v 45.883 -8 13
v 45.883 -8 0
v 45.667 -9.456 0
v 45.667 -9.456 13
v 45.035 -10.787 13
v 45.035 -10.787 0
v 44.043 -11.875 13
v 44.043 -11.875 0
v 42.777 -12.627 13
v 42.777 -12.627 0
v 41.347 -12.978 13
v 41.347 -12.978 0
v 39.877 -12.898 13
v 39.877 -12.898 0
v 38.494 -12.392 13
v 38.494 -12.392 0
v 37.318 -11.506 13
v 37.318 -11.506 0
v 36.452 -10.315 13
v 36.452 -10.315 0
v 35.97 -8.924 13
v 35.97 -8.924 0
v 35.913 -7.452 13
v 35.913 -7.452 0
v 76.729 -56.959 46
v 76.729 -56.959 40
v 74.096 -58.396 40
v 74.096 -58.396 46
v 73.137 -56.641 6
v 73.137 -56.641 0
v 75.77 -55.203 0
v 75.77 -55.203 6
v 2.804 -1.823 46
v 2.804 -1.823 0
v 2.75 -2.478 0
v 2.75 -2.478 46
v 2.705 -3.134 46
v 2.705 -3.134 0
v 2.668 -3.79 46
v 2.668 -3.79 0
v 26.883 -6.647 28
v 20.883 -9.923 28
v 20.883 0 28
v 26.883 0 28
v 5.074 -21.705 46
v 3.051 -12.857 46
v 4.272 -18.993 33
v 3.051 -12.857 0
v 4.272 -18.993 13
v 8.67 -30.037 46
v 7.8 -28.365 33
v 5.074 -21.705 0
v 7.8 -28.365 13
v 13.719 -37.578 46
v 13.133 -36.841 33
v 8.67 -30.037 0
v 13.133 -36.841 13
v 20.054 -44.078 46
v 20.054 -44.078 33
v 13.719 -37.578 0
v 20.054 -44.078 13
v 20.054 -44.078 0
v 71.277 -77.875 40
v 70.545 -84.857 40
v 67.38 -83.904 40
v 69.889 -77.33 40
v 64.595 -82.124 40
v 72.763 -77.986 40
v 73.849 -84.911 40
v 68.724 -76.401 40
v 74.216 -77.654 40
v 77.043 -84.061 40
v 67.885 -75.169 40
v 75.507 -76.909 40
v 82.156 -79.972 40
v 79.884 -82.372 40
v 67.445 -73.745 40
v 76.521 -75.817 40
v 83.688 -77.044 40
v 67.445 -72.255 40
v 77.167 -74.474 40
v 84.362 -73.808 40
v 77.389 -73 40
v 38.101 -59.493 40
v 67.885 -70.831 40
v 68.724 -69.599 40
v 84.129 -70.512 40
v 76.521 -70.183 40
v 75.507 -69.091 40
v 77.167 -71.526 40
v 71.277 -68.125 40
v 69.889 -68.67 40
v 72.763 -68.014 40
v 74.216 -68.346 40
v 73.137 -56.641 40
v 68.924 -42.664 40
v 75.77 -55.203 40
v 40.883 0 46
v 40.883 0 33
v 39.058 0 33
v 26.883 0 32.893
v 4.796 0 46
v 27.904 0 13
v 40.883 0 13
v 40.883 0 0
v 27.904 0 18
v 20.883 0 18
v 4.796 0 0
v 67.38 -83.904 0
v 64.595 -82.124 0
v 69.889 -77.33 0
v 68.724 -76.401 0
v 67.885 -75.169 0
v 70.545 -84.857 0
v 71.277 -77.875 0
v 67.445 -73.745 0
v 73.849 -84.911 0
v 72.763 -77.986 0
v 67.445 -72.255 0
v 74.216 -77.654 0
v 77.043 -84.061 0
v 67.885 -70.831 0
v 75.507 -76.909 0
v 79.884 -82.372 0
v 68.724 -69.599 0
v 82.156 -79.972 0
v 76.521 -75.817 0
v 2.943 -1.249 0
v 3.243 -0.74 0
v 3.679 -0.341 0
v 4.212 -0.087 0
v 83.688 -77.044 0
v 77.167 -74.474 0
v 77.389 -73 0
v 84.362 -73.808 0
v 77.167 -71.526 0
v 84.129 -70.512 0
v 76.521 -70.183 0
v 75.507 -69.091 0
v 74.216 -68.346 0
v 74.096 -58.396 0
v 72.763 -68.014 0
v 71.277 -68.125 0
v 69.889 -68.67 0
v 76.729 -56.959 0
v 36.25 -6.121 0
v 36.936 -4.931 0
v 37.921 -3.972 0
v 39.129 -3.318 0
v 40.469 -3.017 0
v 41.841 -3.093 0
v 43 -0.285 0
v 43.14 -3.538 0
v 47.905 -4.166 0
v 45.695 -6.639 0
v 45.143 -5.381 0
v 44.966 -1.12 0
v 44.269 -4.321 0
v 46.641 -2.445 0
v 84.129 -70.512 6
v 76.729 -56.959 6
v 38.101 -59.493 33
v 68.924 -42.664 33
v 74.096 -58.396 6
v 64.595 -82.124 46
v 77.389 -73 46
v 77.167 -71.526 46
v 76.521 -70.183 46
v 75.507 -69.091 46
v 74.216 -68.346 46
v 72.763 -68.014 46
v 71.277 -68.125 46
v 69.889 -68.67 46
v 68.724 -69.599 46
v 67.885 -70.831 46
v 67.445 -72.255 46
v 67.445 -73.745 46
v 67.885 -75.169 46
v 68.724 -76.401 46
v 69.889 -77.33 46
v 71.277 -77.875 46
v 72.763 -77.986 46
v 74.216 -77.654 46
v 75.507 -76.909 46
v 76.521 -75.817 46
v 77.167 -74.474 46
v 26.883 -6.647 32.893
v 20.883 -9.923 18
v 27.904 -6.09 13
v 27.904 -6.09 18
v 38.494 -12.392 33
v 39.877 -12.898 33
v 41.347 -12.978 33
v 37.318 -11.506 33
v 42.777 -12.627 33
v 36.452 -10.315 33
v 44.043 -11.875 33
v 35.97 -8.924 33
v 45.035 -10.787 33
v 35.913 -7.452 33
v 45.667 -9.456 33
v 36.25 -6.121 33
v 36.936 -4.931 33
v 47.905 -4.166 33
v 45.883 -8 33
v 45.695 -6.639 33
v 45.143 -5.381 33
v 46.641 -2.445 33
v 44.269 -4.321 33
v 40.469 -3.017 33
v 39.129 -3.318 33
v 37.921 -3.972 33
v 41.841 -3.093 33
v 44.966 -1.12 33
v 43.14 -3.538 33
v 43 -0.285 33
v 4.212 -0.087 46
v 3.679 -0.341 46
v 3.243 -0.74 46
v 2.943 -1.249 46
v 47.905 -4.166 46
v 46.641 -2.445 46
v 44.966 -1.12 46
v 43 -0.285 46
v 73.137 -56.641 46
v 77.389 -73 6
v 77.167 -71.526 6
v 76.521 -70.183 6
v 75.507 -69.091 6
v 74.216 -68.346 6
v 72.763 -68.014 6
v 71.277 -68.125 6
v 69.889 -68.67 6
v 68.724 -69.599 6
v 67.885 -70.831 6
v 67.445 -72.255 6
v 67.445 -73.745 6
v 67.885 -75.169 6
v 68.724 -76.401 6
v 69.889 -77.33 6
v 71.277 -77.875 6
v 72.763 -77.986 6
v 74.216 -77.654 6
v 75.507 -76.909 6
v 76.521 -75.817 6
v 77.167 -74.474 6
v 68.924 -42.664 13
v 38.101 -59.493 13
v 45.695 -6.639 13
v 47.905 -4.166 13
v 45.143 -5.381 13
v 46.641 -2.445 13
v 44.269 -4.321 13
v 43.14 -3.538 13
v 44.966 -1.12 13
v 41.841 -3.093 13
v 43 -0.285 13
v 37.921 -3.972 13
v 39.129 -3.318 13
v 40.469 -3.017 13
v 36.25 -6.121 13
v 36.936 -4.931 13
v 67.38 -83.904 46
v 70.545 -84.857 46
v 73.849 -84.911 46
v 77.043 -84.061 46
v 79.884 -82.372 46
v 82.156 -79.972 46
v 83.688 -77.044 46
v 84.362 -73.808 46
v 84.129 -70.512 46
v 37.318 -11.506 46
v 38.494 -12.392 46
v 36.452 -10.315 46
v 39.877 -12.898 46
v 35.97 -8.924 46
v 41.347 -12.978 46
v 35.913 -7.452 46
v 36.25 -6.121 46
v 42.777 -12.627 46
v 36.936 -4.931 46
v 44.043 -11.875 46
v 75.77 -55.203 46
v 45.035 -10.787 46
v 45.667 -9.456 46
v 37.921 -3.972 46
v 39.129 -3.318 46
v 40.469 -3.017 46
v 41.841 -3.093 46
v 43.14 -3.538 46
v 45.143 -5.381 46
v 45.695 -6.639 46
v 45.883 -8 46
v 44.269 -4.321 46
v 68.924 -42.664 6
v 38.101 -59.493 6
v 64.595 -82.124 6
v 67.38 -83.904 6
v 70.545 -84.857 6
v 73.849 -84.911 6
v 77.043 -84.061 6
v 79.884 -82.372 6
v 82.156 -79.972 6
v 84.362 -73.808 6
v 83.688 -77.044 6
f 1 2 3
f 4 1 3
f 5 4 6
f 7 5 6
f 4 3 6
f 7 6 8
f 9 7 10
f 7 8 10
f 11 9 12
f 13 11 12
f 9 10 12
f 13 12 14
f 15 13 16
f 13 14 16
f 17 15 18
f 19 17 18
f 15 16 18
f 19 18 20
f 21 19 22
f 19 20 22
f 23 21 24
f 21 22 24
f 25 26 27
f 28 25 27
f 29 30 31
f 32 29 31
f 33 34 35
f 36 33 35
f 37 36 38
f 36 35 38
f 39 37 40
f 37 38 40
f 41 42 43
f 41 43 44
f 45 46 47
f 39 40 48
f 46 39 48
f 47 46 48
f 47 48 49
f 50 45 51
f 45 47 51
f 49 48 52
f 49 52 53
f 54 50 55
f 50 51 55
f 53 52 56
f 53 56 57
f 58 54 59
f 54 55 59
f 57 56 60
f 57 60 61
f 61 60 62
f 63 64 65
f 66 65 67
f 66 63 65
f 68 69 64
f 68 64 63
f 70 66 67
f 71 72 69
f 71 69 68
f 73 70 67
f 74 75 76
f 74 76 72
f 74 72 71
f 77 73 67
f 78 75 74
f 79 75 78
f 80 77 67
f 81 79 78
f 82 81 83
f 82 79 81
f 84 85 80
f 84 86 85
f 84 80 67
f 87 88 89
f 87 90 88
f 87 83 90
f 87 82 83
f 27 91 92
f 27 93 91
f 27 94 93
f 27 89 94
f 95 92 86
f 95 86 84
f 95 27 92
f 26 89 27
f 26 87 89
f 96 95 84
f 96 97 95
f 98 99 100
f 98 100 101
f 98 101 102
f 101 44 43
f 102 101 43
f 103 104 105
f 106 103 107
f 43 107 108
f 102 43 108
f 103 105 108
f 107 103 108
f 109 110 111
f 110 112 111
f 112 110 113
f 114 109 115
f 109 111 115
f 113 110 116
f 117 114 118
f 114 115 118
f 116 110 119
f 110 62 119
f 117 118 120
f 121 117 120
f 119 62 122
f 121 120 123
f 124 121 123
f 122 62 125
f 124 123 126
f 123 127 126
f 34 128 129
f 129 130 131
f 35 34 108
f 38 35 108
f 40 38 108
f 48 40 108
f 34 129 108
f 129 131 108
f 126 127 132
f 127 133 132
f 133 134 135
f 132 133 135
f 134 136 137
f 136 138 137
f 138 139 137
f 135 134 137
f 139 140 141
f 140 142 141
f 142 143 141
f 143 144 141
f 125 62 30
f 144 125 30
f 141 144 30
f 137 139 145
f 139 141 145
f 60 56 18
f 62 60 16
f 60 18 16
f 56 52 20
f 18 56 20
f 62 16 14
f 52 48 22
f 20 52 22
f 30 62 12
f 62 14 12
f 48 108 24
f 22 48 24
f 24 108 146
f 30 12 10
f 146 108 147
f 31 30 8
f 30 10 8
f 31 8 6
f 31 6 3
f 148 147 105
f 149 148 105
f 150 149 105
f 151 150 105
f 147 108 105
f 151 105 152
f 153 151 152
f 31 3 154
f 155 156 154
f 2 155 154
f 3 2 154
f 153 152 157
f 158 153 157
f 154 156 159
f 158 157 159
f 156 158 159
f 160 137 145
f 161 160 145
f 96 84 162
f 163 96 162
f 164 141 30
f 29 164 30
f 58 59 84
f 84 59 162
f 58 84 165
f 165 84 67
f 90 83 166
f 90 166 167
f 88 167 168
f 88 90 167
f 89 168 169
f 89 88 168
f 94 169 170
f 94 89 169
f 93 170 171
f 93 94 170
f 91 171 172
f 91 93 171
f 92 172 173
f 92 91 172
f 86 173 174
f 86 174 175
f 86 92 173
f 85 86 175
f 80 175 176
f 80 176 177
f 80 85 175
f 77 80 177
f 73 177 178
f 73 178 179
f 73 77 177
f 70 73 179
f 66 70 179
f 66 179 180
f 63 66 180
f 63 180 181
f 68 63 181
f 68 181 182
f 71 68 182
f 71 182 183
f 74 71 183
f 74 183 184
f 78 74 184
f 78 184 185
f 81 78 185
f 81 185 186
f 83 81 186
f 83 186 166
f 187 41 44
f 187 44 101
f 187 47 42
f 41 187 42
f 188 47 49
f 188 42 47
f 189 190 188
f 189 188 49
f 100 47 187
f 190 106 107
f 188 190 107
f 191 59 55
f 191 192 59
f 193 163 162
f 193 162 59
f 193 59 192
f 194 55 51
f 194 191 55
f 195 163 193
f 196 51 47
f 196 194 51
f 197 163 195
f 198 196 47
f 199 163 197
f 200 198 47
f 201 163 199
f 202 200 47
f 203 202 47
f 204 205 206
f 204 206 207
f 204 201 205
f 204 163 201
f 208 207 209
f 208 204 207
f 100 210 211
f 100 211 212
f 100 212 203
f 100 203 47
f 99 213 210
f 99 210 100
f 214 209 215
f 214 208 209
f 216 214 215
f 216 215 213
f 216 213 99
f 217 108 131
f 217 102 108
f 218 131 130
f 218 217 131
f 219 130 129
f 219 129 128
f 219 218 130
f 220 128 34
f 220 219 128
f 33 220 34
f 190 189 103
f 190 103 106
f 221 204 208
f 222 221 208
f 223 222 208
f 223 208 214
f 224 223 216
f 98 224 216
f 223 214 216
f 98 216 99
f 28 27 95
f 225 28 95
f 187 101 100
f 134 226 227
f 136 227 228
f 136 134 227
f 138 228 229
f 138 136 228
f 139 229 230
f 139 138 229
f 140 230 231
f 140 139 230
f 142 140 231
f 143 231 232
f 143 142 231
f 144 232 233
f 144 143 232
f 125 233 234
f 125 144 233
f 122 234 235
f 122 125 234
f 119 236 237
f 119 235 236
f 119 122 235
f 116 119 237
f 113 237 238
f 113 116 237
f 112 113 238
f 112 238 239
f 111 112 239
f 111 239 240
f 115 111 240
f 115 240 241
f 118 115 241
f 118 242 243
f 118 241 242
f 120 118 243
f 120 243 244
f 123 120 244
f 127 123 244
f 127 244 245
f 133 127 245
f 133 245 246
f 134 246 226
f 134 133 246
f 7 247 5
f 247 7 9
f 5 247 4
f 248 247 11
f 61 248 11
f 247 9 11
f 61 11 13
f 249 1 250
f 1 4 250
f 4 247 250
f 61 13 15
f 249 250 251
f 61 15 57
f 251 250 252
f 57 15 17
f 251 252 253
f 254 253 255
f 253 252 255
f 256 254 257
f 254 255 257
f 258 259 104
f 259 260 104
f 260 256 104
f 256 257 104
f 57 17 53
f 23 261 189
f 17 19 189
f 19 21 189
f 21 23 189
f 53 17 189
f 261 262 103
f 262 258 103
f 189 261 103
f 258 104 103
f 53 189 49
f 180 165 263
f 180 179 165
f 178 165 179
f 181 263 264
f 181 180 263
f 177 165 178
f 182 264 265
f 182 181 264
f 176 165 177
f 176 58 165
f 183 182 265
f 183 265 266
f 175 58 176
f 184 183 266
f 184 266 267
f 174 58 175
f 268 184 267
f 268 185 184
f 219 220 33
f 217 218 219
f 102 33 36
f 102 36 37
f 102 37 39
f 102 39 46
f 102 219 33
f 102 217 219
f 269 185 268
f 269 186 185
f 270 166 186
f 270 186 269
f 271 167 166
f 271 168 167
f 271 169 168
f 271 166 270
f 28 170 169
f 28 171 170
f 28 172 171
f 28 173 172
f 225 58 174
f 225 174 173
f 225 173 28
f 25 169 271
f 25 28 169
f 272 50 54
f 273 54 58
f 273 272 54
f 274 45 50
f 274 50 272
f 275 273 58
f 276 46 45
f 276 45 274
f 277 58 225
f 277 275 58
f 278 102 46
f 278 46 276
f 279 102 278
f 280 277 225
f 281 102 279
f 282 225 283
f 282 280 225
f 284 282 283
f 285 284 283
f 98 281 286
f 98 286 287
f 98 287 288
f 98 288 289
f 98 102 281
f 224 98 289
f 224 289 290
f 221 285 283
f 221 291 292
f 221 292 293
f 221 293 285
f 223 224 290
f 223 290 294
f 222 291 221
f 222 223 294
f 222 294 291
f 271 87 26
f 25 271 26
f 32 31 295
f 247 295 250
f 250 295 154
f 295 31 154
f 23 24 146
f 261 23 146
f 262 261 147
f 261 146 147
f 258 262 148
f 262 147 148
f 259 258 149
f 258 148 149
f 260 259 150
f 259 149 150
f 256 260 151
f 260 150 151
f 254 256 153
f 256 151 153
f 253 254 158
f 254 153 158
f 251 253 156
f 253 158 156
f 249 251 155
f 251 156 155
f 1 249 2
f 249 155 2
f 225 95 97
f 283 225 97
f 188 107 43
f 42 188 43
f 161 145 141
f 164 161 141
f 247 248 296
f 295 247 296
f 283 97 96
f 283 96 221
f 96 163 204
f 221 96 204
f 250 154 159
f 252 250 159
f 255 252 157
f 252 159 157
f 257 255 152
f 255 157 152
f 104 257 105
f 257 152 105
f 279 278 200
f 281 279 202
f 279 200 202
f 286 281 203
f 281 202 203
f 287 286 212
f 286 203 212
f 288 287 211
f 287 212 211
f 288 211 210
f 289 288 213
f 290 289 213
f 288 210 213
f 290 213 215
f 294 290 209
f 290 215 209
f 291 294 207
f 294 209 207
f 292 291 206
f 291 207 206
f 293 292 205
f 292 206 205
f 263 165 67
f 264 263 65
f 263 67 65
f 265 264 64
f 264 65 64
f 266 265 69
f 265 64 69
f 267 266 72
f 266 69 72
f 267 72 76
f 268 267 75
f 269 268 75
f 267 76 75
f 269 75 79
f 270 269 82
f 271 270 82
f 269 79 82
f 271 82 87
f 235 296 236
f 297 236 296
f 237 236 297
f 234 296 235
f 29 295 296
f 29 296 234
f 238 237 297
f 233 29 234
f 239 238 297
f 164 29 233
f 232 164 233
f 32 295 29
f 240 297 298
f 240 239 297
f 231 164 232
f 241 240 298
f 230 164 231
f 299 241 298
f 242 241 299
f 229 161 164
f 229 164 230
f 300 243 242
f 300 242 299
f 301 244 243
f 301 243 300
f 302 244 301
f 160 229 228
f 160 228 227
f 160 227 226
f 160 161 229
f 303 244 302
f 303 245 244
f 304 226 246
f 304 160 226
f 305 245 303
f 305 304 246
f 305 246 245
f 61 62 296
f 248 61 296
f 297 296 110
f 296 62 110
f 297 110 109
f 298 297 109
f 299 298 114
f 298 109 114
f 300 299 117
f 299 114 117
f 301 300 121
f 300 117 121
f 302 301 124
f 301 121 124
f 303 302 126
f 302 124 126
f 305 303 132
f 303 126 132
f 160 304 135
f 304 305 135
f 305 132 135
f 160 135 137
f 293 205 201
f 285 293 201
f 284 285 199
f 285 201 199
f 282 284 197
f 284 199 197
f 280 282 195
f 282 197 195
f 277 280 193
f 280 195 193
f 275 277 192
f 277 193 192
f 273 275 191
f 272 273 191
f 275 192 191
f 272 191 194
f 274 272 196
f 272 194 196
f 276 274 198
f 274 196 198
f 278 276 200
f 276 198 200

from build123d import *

# Parameters (mm, degrees)
SKETCH3_R           = 5
BOSS_EXTRUDE1_DEPTH = 46
CUT_EXTRUDE1_DEPTH  = 300
CUT_EXTRUDE2_DEPTH  = 300
FILLET1_R           = 2


with BuildPart() as part:
    # Sketch3 → Boss-Extrude1 (new body)
    with BuildSketch(Plane.XY):
        with BuildLine():
            Line((40.883413809, 0), (3, 0))
            ThreePointArc((3, 0), (2.797908937, -1.891823319), (2.668267594, -3.789988061))
            ThreePointArc((2.668267594, -3.789988061), (6.682027739, -25.953006917), (20.054026368, -44.077557338))
            Line((20.054026368, -44.077557338), (64.595472348, -82.12438231))
            ThreePointArc((64.595472348, -82.12438231), (78.521745085, -83.314776326), (84.128579654, -70.511592488))
            Line((84.128579654, -70.511592488), (76.728855671, -56.958627104))
            Line((76.728855671, -56.958627104), (74.095757005, -58.396261068))
            Line((74.095757005, -58.396261068), (73.137334363, -56.640861957))
            Line((73.137334363, -56.640861957), (75.770433029, -55.203227993))
            Line((75.770433029, -55.203227993), (47.905010252, -4.166309429))
            ThreePointArc((47.905010252, -4.166309429), (44.9657217, -1.119973671), (40.883413809, 0))
        make_face()
        with Locations((72.389421761, -73)):
            Circle(SKETCH3_R, mode=Mode.SUBTRACT)
        with BuildLine():
            ThreePointArc((45.883413809, -8), (40.609242405, -12.992477345), (35.913481792, -7.452482191))
            ThreePointArc((35.913481792, -7.452482191), (41.157585213, -3.007522655), (45.883413809, -8))
        make_face(mode=Mode.SUBTRACT)
    extrude(amount=BOSS_EXTRUDE1_DEPTH)

    # Sketch4 → Cut-Extrude1 (cut)
    with BuildSketch(Plane(origin=(35.151571892, 19.192252189, 0), x_dir=(0, 0, -1), z_dir=(0.877699555, 0.479211321, 0))):
        Polygon((-40, -114.23699177), (-40, -70.47572427), (-33, -70.47572427), (-33, -18.71699177), (-13, -18.71699177), (-13, -70.47572427), (-6, -70.47572427), (-6, -114.23699177), align=None)
    extrude(amount=-CUT_EXTRUDE1_DEPTH, mode=Mode.SUBTRACT)

    # Sketch5 → Cut-Extrude2 (cut)
    with BuildSketch(Plane(origin=(0, 0, 0), x_dir=(1, 0, 0), z_dir=(0, 1, 0))):
        Polygon((39.057908144, -13), (27.904150662, -13), (27.904150662, -18), (20.883413809, -18), (20.883413809, -28), (26.883413809, -28), (26.883413809, -32.893409872), (39.057908144, -33), align=None)
    extrude(amount=-CUT_EXTRUDE2_DEPTH, mode=Mode.SUBTRACT)

    # Fillet1
    fillet1_edges = [part.edges().sort_by_distance(p)[0] for p in [
        (3, 0, 23),
    ]]
    fillet(fillet1_edges, radius=FILLET1_R)


solid = part.part
